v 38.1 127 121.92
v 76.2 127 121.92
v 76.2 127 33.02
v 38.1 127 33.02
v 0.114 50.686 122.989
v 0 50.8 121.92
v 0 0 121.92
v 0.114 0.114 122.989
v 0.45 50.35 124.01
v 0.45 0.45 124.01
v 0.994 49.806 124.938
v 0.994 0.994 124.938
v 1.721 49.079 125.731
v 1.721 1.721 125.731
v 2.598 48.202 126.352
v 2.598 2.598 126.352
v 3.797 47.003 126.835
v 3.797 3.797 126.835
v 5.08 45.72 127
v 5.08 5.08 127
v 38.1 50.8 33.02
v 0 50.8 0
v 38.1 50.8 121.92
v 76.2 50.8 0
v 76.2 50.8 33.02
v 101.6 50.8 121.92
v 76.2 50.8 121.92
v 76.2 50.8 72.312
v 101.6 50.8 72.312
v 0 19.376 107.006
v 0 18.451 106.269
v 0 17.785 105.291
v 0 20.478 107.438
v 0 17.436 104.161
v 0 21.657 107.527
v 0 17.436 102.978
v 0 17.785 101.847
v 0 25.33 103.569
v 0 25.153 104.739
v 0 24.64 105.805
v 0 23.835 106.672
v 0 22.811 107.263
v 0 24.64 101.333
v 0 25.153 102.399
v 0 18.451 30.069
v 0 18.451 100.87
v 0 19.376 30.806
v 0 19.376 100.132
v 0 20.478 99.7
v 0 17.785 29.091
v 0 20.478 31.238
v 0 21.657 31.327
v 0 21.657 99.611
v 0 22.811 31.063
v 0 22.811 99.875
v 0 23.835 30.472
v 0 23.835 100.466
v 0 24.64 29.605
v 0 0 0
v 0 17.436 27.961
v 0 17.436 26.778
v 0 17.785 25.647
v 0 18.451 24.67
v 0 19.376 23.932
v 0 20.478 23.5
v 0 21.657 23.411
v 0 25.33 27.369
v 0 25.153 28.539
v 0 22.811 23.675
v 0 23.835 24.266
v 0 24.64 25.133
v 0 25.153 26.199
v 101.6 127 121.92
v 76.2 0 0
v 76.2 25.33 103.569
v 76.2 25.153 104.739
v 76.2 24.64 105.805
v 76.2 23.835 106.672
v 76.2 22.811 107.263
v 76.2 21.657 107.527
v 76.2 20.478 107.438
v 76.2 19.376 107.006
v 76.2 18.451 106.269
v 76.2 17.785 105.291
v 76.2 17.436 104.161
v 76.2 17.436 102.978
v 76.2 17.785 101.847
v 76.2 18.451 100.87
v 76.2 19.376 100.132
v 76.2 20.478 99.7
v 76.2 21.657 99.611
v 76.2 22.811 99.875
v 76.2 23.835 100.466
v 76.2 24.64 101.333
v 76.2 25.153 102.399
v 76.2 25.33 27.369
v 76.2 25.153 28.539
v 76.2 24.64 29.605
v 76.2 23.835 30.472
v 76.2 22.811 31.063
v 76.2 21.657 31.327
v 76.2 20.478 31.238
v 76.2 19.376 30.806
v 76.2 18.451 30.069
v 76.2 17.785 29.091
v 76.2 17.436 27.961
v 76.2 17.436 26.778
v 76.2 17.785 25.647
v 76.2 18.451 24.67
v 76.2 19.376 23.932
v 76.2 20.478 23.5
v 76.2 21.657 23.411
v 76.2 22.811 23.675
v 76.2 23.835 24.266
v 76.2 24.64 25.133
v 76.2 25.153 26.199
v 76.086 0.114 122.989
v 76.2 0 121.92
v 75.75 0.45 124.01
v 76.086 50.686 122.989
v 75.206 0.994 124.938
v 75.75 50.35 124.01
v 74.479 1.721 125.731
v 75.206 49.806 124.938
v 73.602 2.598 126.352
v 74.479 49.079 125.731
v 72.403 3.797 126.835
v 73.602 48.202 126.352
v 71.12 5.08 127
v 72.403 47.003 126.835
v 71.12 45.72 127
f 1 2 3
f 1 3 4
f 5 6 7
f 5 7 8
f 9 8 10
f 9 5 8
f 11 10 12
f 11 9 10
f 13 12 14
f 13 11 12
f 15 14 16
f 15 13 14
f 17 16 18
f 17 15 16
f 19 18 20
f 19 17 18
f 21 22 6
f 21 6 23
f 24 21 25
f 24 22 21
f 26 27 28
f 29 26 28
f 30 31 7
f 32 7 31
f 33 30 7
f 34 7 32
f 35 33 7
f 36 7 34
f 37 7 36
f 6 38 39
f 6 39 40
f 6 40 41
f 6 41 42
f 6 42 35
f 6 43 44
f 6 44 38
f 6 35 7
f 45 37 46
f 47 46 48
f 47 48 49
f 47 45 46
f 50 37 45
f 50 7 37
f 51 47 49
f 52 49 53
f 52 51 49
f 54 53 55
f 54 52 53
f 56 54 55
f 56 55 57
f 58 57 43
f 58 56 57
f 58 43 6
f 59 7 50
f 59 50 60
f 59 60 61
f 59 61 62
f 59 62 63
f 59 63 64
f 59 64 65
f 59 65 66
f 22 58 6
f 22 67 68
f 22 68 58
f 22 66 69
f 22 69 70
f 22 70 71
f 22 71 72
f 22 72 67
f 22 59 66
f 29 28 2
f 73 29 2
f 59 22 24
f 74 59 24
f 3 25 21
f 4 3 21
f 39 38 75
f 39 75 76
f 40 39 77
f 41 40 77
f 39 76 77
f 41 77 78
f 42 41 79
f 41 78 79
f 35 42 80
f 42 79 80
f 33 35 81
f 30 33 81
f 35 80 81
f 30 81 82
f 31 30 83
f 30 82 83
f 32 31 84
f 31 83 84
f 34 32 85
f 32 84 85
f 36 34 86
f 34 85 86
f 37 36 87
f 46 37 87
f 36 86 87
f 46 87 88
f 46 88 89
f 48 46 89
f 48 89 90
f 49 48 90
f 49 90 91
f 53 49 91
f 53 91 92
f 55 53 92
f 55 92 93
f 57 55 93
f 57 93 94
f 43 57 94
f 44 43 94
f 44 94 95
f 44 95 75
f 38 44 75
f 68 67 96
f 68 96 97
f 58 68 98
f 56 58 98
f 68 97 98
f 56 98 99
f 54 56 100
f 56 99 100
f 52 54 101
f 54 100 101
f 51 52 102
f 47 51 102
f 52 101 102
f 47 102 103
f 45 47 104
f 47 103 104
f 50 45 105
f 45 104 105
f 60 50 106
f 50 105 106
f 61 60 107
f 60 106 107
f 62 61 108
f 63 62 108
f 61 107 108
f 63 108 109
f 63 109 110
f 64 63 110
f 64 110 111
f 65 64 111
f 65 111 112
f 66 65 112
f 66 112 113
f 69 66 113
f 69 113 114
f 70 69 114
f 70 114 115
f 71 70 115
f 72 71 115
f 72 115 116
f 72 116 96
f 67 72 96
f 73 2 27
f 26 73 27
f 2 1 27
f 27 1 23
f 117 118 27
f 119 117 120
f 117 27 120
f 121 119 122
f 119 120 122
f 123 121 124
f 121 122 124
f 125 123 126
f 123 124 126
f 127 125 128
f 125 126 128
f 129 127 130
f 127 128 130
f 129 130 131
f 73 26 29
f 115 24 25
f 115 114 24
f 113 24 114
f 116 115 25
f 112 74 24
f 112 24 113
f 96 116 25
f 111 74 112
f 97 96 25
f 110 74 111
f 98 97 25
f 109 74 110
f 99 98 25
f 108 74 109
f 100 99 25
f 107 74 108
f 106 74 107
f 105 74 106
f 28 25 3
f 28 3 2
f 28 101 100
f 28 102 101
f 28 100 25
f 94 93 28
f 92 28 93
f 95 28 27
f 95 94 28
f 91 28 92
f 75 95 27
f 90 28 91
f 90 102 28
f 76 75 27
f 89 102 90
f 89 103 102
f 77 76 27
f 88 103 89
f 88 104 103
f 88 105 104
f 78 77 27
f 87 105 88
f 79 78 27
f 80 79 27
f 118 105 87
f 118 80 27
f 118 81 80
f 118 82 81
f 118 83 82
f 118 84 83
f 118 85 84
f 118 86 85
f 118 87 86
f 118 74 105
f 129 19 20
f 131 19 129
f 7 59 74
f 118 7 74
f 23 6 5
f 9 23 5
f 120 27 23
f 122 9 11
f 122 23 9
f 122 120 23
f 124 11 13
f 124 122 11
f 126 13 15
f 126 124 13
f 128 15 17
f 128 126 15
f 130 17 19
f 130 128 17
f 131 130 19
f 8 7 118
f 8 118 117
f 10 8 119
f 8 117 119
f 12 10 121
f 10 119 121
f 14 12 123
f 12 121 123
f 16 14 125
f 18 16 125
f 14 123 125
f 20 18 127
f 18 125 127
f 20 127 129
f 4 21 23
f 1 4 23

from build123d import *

# Parameters (mm, degrees)
F0_W     = 76.2
F0_H     = 50.8
F1_DEPTH = 127
F2_R     = 5.08
F4_D     = 7.9375
F5_W     = 38.1
F5_H     = 88.9
F6_DEPTH = 76.2
F8_DEPTH = 25.4


with BuildPart() as f1:
    # F0 (on Top) → F1 (new body)
    with BuildSketch(Plane.XY):
        with Locations((38.1, 25.4)):
            Rectangle(F0_W, F0_H)
    extrude(amount=F1_DEPTH)

    # F2
    f2_edges = [f1.edges().sort_by_distance(p)[0] for p in [
        (0, 25.4, 127),
        (38.1, 0, 127),
        (76.2, 25.4, 127),
        (38.1, 50.8, 127),
    ]]
    fillet(f2_edges, radius=F2_R)

    # F4 (through all)
    with Locations(Plane(origin=(0, 0, 0), x_dir=(0, -1, 0), z_dir=(-1, 0, 0))):
        with Locations((-21.3607754558, 103.5690684751), (-21.3607754558, 27.3690684751)):
            Hole(F4_D / 2)

    # F5 (on face) → F6 (join)
    with BuildSketch(Plane(origin=(0, 50.8, 0), x_dir=(-1, 0, 0), z_dir=(0, 1, 0))):
        with Locations((-57.15, 77.47)):
            Rectangle(F5_W, F5_H)
    extrude(amount=F6_DEPTH)

    # F7 (on face) → F8 (join)
    with BuildSketch(Plane.YZ.offset(76.2)):
        Polygon((127, 121.92), (50.8, 121.92), (50.8, 72.3118260503), align=None)
    extrude(amount=F8_DEPTH)


solid = f1.part
